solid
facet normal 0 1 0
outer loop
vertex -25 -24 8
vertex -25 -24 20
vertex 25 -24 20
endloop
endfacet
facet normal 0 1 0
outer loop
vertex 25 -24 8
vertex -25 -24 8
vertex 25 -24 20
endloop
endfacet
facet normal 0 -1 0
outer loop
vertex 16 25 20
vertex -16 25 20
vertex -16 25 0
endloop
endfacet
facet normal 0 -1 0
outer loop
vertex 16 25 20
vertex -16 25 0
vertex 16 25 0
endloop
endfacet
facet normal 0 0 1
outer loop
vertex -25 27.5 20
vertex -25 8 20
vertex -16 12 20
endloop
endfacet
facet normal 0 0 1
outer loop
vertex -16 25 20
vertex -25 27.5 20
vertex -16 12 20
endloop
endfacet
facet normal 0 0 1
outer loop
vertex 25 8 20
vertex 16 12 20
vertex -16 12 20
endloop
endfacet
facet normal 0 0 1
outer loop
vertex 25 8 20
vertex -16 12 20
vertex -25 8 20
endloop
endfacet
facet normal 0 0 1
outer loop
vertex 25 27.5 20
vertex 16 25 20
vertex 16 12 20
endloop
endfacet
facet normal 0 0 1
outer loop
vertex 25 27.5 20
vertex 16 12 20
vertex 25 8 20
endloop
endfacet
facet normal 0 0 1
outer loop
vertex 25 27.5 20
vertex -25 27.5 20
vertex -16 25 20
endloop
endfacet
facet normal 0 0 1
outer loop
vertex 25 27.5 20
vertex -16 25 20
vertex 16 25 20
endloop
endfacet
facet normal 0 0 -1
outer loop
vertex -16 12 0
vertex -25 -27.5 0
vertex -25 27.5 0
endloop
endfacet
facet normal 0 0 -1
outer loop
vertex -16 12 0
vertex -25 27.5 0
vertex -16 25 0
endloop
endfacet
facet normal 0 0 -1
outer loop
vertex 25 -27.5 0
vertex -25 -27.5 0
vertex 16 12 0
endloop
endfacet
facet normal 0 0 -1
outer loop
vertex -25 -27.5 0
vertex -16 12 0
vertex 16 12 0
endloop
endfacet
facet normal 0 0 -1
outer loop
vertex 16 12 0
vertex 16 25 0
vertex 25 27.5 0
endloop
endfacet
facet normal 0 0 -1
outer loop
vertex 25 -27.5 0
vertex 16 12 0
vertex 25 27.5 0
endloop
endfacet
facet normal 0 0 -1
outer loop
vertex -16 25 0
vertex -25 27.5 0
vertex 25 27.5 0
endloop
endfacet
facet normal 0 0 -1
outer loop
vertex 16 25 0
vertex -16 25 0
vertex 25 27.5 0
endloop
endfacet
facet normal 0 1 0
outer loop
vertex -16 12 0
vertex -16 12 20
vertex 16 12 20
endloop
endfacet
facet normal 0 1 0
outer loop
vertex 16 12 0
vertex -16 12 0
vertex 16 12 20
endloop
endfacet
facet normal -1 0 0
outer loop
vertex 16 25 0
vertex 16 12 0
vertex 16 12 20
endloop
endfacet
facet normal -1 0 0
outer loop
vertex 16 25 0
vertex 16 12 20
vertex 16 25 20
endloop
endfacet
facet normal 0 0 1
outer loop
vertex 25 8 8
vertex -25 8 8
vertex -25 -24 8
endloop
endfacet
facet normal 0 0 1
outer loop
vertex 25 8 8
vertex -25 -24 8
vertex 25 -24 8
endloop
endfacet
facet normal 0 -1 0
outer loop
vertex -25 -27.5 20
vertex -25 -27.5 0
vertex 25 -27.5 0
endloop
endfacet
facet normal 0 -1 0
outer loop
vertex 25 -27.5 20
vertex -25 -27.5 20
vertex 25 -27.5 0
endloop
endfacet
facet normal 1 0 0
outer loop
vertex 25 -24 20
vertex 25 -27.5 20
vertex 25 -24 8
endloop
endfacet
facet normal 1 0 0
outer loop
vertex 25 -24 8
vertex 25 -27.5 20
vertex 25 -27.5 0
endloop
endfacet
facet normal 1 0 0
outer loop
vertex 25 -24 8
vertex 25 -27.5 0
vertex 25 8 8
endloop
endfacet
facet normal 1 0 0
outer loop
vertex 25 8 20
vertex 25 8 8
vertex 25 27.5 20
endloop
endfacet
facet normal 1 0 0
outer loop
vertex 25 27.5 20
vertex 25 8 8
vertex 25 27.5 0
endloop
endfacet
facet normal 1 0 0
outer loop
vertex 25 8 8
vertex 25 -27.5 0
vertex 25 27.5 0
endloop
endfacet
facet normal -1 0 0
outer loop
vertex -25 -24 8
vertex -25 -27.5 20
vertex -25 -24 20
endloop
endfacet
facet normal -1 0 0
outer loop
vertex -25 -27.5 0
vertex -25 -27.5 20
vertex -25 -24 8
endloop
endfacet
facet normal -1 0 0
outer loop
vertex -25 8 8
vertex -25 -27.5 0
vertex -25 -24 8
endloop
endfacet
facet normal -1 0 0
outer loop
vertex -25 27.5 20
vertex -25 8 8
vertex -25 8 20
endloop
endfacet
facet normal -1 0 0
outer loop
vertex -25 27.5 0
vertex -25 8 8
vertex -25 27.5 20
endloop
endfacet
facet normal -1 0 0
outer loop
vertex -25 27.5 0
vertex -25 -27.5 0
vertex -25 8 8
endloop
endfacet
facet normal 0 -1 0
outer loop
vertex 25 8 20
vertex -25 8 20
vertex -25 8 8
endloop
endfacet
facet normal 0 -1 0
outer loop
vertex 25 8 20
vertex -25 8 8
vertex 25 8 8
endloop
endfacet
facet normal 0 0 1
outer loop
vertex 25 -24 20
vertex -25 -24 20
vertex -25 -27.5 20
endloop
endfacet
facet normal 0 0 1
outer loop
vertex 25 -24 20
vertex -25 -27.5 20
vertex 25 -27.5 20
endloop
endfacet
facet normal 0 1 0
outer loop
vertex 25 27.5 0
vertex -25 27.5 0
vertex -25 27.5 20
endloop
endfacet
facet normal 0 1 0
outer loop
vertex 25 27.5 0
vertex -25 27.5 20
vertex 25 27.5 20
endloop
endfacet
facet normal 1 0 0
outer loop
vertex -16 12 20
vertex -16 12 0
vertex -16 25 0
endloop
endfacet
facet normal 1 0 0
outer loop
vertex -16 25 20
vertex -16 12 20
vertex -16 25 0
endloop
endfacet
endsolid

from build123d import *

# Parameters (mm, degrees)
SKETCH_W        = 50
SKETCH_H        = 55
PAD_DEPTH       = 20
SKETCH001_W     = 50
SKETCH001_H     = 32
POCKET_DEPTH    = 12
SKETCH002_W     = 32
SKETCH002_H     = 13
POCKET001_DEPTH = 20


with BuildPart() as part:
    # Sketch → Pad (new body)
    with BuildSketch(Plane.XY):
        Rectangle(SKETCH_W, SKETCH_H)
    extrude(amount=PAD_DEPTH)

    # Sketch001 (on Face6 of Pad) → Pocket (cut)
    with BuildSketch(Plane.XY.offset(20)):
        with Locations((0, -8)):
            Rectangle(SKETCH001_W, SKETCH001_H)
    extrude(amount=-POCKET_DEPTH, mode=Mode.SUBTRACT)

    # Sketch002 (on Face5 of Pocket) → Pocket001 (cut)
    with BuildSketch(Plane.XY.offset(20)):
        with Locations((0, 18.5)):
            Rectangle(SKETCH002_W, SKETCH002_H)
    extrude(amount=-POCKET001_DEPTH, mode=Mode.SUBTRACT)


solid = part.part
